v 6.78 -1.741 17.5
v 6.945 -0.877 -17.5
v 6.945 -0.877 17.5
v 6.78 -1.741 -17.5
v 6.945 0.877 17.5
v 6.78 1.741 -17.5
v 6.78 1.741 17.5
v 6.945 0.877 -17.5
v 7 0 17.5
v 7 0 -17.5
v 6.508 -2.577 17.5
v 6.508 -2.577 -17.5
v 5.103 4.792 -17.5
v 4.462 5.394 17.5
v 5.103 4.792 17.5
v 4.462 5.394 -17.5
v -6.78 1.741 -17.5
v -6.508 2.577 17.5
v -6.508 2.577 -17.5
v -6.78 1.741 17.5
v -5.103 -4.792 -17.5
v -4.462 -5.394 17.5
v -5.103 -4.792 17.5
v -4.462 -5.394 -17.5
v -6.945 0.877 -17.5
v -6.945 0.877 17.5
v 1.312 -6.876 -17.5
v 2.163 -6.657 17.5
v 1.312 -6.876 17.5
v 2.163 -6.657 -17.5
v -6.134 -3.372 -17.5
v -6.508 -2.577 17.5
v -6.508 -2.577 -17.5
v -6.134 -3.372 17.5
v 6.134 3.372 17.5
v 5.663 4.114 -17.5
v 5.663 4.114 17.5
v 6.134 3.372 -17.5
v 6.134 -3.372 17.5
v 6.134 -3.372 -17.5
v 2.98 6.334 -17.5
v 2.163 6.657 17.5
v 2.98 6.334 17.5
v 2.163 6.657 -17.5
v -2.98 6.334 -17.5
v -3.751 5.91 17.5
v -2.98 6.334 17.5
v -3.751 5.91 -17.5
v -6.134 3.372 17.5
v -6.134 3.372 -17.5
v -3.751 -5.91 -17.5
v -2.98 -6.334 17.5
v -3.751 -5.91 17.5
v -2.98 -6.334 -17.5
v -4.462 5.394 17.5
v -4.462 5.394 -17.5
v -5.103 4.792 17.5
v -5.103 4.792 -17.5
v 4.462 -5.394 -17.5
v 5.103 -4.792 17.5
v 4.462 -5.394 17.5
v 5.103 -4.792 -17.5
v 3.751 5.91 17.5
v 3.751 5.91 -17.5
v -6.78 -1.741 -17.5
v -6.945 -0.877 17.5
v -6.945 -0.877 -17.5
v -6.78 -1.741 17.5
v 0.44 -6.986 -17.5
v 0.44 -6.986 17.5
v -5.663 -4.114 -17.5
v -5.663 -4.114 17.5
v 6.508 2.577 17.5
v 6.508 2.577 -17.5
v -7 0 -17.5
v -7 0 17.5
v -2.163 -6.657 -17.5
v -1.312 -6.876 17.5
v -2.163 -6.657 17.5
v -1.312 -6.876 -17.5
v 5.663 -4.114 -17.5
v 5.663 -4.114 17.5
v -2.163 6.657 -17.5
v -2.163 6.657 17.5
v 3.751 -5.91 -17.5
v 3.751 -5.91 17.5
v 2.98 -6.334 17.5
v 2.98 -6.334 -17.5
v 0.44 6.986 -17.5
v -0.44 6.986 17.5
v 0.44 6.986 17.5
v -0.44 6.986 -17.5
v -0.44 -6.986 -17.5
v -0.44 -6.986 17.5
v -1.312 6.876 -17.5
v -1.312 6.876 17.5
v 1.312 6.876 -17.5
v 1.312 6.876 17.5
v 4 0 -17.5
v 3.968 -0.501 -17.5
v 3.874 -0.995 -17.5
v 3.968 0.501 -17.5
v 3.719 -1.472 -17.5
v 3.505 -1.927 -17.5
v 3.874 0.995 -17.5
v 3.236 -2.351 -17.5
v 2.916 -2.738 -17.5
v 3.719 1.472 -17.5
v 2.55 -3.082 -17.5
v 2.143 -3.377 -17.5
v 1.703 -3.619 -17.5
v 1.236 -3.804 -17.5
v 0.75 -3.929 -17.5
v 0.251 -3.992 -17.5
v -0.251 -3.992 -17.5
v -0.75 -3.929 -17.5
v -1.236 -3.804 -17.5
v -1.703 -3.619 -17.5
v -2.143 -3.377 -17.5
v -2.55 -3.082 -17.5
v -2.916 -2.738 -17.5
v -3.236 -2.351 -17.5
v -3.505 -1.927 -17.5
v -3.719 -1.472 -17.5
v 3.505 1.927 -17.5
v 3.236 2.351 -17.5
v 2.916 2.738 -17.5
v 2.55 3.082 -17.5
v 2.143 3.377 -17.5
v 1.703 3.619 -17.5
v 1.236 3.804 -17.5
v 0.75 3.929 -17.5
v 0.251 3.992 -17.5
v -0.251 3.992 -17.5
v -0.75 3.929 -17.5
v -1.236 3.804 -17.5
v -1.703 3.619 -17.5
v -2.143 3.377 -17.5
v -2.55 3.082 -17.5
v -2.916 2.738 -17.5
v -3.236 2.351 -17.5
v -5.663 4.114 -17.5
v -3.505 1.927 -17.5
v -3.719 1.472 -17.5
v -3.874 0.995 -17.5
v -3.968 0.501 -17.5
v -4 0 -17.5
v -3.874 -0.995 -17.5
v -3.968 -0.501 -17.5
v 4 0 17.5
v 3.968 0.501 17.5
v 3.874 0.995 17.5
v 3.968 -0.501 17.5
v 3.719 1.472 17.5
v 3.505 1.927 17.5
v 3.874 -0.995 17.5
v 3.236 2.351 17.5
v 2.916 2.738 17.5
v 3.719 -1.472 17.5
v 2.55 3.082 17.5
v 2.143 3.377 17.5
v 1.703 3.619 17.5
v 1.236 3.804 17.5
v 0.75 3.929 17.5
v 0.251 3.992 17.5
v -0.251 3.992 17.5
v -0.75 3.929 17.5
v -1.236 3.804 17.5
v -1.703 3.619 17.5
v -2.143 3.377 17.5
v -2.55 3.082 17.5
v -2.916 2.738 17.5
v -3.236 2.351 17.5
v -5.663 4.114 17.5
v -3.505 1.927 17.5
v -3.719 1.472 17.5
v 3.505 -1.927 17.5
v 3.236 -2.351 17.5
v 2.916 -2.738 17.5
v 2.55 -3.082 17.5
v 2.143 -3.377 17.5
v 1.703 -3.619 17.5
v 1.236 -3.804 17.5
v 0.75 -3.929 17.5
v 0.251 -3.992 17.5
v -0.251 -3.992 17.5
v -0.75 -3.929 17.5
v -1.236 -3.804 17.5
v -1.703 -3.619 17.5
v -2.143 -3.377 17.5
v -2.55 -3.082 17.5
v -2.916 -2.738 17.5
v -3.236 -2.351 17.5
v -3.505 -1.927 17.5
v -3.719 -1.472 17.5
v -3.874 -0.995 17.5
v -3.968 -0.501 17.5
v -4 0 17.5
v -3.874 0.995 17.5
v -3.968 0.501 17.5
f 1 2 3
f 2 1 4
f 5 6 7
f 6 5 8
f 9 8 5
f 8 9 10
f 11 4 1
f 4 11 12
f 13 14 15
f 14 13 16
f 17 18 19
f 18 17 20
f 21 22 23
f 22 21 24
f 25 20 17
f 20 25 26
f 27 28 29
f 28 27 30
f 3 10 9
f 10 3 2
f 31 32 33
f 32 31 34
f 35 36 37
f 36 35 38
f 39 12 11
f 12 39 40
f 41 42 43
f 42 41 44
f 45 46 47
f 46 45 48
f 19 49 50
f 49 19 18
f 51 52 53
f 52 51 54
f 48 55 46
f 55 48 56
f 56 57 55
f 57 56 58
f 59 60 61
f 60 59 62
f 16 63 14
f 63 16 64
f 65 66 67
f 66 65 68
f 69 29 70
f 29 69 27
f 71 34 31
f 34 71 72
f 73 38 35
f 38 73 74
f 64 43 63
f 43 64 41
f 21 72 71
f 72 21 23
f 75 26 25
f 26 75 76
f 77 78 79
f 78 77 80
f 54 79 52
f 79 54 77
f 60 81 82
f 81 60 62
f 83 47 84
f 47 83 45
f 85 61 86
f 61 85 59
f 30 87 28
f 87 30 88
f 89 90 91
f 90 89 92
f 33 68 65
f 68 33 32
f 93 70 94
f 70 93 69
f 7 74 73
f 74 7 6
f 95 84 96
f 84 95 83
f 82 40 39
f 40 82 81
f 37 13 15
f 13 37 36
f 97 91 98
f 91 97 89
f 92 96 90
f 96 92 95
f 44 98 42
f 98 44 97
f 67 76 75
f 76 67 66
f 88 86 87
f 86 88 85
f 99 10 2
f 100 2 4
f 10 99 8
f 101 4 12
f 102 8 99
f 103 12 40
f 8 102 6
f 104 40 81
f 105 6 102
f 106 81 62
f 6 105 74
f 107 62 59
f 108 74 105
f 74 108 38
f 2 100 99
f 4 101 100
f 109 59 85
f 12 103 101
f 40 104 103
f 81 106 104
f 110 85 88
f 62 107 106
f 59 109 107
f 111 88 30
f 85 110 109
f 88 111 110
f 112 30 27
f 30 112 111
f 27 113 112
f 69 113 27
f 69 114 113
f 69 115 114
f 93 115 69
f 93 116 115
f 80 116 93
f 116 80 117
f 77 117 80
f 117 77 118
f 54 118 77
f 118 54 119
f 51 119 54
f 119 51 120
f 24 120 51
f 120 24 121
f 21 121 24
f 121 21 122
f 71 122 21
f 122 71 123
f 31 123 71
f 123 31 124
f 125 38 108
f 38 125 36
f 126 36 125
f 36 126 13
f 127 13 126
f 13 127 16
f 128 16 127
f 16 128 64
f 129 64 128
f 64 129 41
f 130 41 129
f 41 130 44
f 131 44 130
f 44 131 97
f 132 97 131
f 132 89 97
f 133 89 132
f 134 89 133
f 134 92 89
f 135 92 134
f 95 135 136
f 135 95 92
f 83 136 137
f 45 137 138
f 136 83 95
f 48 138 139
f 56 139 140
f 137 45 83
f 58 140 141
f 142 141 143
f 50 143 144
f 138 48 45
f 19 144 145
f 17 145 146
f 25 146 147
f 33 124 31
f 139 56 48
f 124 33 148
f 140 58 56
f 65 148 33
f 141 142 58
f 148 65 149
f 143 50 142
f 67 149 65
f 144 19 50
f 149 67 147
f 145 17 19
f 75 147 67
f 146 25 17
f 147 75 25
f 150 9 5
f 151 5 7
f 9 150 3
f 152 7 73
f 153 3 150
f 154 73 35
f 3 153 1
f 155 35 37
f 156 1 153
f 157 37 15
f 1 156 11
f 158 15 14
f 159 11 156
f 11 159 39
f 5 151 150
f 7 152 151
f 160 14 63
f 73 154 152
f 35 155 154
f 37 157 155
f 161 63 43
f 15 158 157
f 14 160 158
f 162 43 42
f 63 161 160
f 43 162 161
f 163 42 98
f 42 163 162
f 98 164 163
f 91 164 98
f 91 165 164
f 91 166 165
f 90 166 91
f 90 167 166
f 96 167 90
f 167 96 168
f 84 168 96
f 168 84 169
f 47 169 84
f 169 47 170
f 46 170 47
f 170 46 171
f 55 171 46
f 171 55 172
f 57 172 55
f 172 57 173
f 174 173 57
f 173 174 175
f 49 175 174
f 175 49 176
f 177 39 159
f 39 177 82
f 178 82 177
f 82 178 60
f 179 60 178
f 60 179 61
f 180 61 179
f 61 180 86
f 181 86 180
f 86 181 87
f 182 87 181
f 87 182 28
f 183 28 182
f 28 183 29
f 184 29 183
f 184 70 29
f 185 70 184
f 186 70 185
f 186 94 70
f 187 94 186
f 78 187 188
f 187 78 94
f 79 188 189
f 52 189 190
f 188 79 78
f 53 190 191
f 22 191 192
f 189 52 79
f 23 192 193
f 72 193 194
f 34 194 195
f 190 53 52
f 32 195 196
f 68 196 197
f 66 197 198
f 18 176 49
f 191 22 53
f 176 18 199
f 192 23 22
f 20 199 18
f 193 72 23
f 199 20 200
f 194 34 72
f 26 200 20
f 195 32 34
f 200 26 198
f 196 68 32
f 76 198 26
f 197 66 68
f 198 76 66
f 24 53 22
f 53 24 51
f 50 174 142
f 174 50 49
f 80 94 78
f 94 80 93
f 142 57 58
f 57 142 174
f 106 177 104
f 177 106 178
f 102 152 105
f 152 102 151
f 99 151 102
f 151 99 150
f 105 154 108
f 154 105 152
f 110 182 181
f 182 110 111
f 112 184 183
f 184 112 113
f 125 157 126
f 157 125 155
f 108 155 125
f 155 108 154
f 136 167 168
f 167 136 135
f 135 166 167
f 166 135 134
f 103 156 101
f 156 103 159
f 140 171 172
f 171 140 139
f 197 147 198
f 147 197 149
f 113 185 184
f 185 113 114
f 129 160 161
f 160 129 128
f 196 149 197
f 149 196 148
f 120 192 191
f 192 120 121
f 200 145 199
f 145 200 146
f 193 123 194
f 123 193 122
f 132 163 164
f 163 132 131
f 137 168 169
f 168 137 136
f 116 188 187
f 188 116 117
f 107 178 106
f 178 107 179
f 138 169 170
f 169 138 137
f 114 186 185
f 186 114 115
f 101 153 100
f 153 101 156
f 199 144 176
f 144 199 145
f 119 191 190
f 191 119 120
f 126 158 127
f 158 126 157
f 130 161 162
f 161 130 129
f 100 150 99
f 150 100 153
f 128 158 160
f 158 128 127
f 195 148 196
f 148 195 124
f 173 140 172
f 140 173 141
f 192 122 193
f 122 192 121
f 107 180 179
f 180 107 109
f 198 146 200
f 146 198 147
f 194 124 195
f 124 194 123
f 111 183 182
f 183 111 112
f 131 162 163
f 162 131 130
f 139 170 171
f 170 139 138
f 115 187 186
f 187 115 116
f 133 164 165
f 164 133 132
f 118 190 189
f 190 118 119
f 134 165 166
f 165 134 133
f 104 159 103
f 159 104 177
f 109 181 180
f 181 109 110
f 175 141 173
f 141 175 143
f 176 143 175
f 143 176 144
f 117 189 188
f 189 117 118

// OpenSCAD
$fn = 50;


difference() {
	union() {
		translate(v = [0, 0, -17.5000000000]) {
			cylinder(h = 35, r = 7.0000000000);
		}
	}
	union() {
		translate(v = [0, 0, -100.0000000000]) {
			cylinder(h = 200, r = 4.0000000000);
		}
	}
}
